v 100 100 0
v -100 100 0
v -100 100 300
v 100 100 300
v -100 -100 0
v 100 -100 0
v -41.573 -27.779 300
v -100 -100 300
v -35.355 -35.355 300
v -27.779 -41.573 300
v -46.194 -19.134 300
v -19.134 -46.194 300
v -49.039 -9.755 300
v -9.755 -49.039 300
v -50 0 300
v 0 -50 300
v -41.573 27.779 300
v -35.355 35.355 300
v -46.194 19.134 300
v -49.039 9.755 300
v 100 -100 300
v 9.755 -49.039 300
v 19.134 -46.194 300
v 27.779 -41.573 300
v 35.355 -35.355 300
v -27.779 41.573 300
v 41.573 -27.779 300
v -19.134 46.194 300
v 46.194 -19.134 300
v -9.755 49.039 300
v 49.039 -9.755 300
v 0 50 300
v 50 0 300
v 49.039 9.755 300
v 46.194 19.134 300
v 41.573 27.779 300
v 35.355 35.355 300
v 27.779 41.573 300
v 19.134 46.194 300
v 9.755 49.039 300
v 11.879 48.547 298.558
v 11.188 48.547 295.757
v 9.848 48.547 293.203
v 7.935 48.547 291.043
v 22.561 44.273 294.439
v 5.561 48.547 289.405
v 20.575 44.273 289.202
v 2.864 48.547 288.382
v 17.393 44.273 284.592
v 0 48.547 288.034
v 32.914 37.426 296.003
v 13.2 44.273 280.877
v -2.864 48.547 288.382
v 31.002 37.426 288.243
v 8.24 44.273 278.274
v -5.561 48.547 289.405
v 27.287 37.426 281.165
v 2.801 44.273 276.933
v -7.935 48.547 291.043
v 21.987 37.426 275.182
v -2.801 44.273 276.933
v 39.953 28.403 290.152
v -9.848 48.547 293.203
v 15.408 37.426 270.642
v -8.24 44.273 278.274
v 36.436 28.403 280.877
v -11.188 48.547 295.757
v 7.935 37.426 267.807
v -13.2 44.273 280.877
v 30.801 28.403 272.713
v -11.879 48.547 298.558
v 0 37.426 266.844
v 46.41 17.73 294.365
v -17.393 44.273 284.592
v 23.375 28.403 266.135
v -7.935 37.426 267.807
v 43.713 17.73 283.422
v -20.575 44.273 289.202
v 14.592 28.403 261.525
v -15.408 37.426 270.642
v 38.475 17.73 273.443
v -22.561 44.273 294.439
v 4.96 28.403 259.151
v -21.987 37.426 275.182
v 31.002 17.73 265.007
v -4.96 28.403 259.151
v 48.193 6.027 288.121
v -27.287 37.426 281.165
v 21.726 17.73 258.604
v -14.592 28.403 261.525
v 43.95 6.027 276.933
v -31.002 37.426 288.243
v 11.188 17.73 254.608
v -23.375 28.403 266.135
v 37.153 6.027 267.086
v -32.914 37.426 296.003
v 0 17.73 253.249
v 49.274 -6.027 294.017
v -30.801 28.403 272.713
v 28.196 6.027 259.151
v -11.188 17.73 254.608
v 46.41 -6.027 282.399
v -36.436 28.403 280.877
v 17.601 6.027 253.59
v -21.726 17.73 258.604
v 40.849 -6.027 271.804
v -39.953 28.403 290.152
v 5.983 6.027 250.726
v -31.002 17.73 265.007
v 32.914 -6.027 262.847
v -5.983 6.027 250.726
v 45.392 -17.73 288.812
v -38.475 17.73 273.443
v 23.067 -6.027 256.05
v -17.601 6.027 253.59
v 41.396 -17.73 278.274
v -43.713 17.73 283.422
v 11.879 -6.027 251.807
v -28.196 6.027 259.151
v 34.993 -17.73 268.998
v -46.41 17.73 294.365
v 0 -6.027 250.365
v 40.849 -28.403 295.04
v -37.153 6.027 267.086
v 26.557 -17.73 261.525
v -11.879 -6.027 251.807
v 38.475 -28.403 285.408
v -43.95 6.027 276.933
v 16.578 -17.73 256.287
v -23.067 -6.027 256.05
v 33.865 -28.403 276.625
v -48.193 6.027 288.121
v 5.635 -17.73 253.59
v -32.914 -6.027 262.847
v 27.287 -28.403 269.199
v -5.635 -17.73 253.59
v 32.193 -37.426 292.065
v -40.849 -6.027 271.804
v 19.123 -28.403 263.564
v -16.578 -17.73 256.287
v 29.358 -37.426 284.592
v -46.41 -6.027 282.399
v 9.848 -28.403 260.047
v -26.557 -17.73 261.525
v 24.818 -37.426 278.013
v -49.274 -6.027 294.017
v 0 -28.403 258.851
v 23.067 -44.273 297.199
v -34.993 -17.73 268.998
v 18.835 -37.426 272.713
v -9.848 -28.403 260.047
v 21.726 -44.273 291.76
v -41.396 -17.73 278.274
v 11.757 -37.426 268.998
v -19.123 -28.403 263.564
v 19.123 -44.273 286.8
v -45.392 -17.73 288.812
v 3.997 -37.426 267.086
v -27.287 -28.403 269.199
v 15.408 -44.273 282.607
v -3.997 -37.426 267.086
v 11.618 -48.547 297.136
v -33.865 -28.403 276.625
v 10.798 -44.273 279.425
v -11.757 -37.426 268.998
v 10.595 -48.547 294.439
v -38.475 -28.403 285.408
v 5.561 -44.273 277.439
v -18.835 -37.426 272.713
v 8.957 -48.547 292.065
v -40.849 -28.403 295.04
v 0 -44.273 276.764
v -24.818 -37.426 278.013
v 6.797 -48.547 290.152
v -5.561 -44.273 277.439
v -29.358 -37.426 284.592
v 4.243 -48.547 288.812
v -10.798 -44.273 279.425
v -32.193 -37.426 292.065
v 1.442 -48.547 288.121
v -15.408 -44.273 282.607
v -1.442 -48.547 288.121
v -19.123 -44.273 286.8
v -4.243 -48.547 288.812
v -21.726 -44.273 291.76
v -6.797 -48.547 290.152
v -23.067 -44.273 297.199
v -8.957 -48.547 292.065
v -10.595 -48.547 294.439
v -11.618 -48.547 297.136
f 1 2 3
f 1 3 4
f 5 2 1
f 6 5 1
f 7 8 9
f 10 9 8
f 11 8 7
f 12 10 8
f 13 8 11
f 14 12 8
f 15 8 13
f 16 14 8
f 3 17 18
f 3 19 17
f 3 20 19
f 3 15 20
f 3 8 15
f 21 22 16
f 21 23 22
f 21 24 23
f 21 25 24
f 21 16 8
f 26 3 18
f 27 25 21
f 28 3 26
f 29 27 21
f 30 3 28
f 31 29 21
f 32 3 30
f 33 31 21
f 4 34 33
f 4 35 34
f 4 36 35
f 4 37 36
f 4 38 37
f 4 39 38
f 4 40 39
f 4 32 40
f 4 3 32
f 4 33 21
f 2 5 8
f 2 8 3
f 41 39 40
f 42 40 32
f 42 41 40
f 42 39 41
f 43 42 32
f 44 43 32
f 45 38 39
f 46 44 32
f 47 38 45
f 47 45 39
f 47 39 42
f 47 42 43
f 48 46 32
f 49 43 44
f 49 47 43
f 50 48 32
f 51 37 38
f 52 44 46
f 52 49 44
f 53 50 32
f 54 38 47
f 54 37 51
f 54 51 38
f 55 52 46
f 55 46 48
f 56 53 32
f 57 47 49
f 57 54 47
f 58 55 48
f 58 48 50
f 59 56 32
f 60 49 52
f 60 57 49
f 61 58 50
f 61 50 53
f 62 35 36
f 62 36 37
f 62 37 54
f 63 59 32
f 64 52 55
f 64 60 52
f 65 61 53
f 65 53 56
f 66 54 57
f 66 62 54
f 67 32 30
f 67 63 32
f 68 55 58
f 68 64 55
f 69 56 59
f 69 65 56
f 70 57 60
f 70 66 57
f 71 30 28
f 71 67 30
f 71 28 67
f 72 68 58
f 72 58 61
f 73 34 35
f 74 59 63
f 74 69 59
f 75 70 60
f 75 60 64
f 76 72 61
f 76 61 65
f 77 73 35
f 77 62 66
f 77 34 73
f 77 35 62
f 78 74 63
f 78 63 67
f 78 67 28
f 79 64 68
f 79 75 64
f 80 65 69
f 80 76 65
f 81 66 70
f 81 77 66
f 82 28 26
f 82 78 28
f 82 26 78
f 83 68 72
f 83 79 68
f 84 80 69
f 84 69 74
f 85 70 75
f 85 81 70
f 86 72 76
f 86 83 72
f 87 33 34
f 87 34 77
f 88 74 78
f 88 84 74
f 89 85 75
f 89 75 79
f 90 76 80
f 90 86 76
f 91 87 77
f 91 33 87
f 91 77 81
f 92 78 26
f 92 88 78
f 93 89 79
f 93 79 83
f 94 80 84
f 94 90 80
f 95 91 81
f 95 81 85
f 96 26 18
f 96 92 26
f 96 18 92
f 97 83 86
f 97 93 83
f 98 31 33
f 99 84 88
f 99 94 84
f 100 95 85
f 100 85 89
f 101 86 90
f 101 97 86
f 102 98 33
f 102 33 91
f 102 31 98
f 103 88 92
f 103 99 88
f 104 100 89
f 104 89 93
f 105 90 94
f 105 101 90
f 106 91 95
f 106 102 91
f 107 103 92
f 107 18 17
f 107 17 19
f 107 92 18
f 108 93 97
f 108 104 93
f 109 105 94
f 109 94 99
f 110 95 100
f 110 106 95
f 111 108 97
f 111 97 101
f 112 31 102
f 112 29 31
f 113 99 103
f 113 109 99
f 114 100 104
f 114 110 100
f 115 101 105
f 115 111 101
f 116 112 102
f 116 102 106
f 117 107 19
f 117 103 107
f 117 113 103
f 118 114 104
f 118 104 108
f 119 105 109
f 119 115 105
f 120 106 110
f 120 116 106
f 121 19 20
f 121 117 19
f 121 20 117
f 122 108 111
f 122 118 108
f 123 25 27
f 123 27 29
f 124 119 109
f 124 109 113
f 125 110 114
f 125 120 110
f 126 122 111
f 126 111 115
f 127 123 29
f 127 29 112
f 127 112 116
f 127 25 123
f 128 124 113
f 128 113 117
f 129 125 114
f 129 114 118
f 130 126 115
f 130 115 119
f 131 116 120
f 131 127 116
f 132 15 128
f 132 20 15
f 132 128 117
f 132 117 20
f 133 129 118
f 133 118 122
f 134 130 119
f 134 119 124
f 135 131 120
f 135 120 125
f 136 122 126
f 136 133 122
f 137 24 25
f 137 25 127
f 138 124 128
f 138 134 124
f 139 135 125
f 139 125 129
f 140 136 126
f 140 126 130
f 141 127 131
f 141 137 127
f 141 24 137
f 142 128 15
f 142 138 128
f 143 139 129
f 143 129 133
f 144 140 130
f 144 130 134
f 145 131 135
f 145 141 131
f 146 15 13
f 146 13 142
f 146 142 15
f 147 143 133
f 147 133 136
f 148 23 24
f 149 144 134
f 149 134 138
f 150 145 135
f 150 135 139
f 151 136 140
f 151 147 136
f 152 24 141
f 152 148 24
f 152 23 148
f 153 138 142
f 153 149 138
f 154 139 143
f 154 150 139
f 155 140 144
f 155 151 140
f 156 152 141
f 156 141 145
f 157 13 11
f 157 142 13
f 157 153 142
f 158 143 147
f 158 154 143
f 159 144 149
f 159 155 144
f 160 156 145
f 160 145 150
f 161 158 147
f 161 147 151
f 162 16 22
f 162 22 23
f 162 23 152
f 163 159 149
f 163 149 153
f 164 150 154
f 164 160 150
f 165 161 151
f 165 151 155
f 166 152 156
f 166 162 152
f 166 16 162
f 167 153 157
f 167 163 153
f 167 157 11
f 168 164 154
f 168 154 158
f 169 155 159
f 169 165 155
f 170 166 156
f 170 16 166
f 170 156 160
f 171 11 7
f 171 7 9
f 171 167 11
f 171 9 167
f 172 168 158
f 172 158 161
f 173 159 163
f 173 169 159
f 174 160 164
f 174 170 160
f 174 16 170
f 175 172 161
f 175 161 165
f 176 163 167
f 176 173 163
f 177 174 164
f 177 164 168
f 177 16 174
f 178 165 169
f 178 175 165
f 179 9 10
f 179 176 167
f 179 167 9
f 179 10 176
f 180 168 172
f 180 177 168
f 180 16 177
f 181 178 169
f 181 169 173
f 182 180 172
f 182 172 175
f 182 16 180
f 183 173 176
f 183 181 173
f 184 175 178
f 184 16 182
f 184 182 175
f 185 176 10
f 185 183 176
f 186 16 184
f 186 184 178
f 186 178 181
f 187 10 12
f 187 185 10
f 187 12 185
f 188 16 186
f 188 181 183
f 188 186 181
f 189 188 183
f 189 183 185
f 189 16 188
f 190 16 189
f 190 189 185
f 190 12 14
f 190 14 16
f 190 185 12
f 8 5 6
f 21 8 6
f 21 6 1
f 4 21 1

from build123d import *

# Parameters (mm, degrees)
F0_W     = 200
F0_H     = 200
F1_DEPTH = 300


with BuildPart() as f1:
    # F0 (on Top) → F1 (new body)
    with BuildSketch(Plane.XY):
        Rectangle(F0_W, F0_H)
    extrude(amount=F1_DEPTH)

    # F2 (on Right) → F3 (revolve, cut)
    with BuildSketch(Plane.YZ):
        with BuildLine():
            ThreePointArc((50, 300), (0, 350), (-50, 300))
            Line((-50, 300), (50, 300))
        make_face()
    revolve(axis=Axis((0, 0, 300), (0, 1, 0)), mode=Mode.SUBTRACT)


solid = f1.part
